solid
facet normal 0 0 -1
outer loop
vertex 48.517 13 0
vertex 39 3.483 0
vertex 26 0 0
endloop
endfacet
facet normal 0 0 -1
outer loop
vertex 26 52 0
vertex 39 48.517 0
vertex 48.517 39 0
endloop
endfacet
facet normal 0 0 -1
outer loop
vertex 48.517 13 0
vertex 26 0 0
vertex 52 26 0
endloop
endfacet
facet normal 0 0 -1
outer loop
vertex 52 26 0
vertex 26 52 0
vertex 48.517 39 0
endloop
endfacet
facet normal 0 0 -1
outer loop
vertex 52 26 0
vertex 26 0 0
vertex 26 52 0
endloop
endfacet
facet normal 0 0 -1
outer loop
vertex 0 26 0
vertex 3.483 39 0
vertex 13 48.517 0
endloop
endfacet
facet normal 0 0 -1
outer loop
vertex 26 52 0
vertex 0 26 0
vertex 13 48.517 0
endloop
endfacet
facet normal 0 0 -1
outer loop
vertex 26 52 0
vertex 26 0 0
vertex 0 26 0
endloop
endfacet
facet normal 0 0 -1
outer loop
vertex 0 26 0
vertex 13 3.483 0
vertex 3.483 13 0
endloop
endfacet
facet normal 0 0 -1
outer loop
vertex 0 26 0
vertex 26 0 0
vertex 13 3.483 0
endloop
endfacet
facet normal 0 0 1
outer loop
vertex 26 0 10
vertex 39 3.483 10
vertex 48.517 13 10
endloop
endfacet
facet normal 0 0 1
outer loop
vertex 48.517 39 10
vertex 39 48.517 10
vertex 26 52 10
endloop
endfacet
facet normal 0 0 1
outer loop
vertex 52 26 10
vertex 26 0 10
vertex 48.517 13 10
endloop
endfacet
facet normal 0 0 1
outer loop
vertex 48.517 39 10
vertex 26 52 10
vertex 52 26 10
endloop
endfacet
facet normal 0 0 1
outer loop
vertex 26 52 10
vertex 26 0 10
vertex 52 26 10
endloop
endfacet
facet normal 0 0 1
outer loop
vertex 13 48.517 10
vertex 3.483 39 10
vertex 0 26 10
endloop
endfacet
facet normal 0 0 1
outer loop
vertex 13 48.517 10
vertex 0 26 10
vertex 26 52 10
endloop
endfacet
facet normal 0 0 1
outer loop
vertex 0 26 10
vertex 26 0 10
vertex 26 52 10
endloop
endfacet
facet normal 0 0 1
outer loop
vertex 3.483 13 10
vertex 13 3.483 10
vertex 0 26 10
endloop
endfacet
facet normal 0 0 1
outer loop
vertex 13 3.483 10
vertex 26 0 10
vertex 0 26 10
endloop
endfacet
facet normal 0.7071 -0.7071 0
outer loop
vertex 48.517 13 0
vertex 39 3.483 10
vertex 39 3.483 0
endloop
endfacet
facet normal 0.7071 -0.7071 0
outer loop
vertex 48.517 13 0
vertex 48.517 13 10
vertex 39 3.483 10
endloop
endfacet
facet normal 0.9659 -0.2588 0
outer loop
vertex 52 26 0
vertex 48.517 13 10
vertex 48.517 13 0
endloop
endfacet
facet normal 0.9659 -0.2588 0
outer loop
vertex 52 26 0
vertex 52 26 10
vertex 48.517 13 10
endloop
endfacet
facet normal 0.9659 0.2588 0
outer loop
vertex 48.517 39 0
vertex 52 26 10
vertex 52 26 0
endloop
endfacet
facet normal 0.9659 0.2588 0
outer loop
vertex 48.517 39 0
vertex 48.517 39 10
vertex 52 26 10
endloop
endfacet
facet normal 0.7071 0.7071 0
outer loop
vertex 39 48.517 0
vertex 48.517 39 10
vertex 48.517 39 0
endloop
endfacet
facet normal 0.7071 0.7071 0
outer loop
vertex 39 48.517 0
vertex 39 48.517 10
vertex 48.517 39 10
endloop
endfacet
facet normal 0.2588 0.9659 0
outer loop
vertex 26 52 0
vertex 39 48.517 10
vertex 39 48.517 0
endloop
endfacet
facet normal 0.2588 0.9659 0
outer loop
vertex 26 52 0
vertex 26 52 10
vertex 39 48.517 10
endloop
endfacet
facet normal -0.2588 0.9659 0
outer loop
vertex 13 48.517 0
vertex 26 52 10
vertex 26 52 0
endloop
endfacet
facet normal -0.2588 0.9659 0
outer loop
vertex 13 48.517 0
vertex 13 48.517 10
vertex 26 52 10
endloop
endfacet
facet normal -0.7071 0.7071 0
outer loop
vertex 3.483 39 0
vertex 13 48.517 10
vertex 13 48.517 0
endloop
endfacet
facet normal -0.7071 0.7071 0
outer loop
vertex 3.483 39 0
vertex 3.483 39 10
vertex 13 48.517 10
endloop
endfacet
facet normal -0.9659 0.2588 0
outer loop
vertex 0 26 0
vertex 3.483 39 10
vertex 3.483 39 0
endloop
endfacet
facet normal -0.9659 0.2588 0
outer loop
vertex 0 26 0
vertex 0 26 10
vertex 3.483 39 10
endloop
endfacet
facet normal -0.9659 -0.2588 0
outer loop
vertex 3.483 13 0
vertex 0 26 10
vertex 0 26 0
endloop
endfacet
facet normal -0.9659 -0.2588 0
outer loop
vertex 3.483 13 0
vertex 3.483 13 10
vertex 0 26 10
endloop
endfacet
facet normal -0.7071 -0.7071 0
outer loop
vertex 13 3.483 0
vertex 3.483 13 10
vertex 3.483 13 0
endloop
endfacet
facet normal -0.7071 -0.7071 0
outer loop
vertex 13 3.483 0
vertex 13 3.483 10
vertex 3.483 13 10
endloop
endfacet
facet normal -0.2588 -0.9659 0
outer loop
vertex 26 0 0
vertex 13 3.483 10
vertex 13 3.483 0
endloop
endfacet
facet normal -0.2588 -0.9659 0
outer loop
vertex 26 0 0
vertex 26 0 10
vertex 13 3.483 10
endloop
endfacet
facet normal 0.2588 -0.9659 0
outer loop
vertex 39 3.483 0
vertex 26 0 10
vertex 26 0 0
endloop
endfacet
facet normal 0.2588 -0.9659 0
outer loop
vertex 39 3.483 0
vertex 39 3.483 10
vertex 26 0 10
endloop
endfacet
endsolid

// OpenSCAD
$fn = 32;

// ----------------------------------------------------------------------
// Eccentric disc: step, 10 mm thick
// ----------------------------------------------------------------------

// --- parameters (mm) ---
profile_height = 10;      // extrusion height
profile_points = 12;      // points of the closed outline

profile = [[0, 26], [3.483, 13], [13, 3.483], [26, 0], [39, 3.483], [48.517, 13], [52, 26], [48.517, 39], [39, 48.517], [26, 52], [13, 48.517], [3.483, 39]];  // single closed polygon, 12 points, counter clockwise

// --- the one profile operation ---
linear_extrude(height = profile_height) polygon(points = profile);
